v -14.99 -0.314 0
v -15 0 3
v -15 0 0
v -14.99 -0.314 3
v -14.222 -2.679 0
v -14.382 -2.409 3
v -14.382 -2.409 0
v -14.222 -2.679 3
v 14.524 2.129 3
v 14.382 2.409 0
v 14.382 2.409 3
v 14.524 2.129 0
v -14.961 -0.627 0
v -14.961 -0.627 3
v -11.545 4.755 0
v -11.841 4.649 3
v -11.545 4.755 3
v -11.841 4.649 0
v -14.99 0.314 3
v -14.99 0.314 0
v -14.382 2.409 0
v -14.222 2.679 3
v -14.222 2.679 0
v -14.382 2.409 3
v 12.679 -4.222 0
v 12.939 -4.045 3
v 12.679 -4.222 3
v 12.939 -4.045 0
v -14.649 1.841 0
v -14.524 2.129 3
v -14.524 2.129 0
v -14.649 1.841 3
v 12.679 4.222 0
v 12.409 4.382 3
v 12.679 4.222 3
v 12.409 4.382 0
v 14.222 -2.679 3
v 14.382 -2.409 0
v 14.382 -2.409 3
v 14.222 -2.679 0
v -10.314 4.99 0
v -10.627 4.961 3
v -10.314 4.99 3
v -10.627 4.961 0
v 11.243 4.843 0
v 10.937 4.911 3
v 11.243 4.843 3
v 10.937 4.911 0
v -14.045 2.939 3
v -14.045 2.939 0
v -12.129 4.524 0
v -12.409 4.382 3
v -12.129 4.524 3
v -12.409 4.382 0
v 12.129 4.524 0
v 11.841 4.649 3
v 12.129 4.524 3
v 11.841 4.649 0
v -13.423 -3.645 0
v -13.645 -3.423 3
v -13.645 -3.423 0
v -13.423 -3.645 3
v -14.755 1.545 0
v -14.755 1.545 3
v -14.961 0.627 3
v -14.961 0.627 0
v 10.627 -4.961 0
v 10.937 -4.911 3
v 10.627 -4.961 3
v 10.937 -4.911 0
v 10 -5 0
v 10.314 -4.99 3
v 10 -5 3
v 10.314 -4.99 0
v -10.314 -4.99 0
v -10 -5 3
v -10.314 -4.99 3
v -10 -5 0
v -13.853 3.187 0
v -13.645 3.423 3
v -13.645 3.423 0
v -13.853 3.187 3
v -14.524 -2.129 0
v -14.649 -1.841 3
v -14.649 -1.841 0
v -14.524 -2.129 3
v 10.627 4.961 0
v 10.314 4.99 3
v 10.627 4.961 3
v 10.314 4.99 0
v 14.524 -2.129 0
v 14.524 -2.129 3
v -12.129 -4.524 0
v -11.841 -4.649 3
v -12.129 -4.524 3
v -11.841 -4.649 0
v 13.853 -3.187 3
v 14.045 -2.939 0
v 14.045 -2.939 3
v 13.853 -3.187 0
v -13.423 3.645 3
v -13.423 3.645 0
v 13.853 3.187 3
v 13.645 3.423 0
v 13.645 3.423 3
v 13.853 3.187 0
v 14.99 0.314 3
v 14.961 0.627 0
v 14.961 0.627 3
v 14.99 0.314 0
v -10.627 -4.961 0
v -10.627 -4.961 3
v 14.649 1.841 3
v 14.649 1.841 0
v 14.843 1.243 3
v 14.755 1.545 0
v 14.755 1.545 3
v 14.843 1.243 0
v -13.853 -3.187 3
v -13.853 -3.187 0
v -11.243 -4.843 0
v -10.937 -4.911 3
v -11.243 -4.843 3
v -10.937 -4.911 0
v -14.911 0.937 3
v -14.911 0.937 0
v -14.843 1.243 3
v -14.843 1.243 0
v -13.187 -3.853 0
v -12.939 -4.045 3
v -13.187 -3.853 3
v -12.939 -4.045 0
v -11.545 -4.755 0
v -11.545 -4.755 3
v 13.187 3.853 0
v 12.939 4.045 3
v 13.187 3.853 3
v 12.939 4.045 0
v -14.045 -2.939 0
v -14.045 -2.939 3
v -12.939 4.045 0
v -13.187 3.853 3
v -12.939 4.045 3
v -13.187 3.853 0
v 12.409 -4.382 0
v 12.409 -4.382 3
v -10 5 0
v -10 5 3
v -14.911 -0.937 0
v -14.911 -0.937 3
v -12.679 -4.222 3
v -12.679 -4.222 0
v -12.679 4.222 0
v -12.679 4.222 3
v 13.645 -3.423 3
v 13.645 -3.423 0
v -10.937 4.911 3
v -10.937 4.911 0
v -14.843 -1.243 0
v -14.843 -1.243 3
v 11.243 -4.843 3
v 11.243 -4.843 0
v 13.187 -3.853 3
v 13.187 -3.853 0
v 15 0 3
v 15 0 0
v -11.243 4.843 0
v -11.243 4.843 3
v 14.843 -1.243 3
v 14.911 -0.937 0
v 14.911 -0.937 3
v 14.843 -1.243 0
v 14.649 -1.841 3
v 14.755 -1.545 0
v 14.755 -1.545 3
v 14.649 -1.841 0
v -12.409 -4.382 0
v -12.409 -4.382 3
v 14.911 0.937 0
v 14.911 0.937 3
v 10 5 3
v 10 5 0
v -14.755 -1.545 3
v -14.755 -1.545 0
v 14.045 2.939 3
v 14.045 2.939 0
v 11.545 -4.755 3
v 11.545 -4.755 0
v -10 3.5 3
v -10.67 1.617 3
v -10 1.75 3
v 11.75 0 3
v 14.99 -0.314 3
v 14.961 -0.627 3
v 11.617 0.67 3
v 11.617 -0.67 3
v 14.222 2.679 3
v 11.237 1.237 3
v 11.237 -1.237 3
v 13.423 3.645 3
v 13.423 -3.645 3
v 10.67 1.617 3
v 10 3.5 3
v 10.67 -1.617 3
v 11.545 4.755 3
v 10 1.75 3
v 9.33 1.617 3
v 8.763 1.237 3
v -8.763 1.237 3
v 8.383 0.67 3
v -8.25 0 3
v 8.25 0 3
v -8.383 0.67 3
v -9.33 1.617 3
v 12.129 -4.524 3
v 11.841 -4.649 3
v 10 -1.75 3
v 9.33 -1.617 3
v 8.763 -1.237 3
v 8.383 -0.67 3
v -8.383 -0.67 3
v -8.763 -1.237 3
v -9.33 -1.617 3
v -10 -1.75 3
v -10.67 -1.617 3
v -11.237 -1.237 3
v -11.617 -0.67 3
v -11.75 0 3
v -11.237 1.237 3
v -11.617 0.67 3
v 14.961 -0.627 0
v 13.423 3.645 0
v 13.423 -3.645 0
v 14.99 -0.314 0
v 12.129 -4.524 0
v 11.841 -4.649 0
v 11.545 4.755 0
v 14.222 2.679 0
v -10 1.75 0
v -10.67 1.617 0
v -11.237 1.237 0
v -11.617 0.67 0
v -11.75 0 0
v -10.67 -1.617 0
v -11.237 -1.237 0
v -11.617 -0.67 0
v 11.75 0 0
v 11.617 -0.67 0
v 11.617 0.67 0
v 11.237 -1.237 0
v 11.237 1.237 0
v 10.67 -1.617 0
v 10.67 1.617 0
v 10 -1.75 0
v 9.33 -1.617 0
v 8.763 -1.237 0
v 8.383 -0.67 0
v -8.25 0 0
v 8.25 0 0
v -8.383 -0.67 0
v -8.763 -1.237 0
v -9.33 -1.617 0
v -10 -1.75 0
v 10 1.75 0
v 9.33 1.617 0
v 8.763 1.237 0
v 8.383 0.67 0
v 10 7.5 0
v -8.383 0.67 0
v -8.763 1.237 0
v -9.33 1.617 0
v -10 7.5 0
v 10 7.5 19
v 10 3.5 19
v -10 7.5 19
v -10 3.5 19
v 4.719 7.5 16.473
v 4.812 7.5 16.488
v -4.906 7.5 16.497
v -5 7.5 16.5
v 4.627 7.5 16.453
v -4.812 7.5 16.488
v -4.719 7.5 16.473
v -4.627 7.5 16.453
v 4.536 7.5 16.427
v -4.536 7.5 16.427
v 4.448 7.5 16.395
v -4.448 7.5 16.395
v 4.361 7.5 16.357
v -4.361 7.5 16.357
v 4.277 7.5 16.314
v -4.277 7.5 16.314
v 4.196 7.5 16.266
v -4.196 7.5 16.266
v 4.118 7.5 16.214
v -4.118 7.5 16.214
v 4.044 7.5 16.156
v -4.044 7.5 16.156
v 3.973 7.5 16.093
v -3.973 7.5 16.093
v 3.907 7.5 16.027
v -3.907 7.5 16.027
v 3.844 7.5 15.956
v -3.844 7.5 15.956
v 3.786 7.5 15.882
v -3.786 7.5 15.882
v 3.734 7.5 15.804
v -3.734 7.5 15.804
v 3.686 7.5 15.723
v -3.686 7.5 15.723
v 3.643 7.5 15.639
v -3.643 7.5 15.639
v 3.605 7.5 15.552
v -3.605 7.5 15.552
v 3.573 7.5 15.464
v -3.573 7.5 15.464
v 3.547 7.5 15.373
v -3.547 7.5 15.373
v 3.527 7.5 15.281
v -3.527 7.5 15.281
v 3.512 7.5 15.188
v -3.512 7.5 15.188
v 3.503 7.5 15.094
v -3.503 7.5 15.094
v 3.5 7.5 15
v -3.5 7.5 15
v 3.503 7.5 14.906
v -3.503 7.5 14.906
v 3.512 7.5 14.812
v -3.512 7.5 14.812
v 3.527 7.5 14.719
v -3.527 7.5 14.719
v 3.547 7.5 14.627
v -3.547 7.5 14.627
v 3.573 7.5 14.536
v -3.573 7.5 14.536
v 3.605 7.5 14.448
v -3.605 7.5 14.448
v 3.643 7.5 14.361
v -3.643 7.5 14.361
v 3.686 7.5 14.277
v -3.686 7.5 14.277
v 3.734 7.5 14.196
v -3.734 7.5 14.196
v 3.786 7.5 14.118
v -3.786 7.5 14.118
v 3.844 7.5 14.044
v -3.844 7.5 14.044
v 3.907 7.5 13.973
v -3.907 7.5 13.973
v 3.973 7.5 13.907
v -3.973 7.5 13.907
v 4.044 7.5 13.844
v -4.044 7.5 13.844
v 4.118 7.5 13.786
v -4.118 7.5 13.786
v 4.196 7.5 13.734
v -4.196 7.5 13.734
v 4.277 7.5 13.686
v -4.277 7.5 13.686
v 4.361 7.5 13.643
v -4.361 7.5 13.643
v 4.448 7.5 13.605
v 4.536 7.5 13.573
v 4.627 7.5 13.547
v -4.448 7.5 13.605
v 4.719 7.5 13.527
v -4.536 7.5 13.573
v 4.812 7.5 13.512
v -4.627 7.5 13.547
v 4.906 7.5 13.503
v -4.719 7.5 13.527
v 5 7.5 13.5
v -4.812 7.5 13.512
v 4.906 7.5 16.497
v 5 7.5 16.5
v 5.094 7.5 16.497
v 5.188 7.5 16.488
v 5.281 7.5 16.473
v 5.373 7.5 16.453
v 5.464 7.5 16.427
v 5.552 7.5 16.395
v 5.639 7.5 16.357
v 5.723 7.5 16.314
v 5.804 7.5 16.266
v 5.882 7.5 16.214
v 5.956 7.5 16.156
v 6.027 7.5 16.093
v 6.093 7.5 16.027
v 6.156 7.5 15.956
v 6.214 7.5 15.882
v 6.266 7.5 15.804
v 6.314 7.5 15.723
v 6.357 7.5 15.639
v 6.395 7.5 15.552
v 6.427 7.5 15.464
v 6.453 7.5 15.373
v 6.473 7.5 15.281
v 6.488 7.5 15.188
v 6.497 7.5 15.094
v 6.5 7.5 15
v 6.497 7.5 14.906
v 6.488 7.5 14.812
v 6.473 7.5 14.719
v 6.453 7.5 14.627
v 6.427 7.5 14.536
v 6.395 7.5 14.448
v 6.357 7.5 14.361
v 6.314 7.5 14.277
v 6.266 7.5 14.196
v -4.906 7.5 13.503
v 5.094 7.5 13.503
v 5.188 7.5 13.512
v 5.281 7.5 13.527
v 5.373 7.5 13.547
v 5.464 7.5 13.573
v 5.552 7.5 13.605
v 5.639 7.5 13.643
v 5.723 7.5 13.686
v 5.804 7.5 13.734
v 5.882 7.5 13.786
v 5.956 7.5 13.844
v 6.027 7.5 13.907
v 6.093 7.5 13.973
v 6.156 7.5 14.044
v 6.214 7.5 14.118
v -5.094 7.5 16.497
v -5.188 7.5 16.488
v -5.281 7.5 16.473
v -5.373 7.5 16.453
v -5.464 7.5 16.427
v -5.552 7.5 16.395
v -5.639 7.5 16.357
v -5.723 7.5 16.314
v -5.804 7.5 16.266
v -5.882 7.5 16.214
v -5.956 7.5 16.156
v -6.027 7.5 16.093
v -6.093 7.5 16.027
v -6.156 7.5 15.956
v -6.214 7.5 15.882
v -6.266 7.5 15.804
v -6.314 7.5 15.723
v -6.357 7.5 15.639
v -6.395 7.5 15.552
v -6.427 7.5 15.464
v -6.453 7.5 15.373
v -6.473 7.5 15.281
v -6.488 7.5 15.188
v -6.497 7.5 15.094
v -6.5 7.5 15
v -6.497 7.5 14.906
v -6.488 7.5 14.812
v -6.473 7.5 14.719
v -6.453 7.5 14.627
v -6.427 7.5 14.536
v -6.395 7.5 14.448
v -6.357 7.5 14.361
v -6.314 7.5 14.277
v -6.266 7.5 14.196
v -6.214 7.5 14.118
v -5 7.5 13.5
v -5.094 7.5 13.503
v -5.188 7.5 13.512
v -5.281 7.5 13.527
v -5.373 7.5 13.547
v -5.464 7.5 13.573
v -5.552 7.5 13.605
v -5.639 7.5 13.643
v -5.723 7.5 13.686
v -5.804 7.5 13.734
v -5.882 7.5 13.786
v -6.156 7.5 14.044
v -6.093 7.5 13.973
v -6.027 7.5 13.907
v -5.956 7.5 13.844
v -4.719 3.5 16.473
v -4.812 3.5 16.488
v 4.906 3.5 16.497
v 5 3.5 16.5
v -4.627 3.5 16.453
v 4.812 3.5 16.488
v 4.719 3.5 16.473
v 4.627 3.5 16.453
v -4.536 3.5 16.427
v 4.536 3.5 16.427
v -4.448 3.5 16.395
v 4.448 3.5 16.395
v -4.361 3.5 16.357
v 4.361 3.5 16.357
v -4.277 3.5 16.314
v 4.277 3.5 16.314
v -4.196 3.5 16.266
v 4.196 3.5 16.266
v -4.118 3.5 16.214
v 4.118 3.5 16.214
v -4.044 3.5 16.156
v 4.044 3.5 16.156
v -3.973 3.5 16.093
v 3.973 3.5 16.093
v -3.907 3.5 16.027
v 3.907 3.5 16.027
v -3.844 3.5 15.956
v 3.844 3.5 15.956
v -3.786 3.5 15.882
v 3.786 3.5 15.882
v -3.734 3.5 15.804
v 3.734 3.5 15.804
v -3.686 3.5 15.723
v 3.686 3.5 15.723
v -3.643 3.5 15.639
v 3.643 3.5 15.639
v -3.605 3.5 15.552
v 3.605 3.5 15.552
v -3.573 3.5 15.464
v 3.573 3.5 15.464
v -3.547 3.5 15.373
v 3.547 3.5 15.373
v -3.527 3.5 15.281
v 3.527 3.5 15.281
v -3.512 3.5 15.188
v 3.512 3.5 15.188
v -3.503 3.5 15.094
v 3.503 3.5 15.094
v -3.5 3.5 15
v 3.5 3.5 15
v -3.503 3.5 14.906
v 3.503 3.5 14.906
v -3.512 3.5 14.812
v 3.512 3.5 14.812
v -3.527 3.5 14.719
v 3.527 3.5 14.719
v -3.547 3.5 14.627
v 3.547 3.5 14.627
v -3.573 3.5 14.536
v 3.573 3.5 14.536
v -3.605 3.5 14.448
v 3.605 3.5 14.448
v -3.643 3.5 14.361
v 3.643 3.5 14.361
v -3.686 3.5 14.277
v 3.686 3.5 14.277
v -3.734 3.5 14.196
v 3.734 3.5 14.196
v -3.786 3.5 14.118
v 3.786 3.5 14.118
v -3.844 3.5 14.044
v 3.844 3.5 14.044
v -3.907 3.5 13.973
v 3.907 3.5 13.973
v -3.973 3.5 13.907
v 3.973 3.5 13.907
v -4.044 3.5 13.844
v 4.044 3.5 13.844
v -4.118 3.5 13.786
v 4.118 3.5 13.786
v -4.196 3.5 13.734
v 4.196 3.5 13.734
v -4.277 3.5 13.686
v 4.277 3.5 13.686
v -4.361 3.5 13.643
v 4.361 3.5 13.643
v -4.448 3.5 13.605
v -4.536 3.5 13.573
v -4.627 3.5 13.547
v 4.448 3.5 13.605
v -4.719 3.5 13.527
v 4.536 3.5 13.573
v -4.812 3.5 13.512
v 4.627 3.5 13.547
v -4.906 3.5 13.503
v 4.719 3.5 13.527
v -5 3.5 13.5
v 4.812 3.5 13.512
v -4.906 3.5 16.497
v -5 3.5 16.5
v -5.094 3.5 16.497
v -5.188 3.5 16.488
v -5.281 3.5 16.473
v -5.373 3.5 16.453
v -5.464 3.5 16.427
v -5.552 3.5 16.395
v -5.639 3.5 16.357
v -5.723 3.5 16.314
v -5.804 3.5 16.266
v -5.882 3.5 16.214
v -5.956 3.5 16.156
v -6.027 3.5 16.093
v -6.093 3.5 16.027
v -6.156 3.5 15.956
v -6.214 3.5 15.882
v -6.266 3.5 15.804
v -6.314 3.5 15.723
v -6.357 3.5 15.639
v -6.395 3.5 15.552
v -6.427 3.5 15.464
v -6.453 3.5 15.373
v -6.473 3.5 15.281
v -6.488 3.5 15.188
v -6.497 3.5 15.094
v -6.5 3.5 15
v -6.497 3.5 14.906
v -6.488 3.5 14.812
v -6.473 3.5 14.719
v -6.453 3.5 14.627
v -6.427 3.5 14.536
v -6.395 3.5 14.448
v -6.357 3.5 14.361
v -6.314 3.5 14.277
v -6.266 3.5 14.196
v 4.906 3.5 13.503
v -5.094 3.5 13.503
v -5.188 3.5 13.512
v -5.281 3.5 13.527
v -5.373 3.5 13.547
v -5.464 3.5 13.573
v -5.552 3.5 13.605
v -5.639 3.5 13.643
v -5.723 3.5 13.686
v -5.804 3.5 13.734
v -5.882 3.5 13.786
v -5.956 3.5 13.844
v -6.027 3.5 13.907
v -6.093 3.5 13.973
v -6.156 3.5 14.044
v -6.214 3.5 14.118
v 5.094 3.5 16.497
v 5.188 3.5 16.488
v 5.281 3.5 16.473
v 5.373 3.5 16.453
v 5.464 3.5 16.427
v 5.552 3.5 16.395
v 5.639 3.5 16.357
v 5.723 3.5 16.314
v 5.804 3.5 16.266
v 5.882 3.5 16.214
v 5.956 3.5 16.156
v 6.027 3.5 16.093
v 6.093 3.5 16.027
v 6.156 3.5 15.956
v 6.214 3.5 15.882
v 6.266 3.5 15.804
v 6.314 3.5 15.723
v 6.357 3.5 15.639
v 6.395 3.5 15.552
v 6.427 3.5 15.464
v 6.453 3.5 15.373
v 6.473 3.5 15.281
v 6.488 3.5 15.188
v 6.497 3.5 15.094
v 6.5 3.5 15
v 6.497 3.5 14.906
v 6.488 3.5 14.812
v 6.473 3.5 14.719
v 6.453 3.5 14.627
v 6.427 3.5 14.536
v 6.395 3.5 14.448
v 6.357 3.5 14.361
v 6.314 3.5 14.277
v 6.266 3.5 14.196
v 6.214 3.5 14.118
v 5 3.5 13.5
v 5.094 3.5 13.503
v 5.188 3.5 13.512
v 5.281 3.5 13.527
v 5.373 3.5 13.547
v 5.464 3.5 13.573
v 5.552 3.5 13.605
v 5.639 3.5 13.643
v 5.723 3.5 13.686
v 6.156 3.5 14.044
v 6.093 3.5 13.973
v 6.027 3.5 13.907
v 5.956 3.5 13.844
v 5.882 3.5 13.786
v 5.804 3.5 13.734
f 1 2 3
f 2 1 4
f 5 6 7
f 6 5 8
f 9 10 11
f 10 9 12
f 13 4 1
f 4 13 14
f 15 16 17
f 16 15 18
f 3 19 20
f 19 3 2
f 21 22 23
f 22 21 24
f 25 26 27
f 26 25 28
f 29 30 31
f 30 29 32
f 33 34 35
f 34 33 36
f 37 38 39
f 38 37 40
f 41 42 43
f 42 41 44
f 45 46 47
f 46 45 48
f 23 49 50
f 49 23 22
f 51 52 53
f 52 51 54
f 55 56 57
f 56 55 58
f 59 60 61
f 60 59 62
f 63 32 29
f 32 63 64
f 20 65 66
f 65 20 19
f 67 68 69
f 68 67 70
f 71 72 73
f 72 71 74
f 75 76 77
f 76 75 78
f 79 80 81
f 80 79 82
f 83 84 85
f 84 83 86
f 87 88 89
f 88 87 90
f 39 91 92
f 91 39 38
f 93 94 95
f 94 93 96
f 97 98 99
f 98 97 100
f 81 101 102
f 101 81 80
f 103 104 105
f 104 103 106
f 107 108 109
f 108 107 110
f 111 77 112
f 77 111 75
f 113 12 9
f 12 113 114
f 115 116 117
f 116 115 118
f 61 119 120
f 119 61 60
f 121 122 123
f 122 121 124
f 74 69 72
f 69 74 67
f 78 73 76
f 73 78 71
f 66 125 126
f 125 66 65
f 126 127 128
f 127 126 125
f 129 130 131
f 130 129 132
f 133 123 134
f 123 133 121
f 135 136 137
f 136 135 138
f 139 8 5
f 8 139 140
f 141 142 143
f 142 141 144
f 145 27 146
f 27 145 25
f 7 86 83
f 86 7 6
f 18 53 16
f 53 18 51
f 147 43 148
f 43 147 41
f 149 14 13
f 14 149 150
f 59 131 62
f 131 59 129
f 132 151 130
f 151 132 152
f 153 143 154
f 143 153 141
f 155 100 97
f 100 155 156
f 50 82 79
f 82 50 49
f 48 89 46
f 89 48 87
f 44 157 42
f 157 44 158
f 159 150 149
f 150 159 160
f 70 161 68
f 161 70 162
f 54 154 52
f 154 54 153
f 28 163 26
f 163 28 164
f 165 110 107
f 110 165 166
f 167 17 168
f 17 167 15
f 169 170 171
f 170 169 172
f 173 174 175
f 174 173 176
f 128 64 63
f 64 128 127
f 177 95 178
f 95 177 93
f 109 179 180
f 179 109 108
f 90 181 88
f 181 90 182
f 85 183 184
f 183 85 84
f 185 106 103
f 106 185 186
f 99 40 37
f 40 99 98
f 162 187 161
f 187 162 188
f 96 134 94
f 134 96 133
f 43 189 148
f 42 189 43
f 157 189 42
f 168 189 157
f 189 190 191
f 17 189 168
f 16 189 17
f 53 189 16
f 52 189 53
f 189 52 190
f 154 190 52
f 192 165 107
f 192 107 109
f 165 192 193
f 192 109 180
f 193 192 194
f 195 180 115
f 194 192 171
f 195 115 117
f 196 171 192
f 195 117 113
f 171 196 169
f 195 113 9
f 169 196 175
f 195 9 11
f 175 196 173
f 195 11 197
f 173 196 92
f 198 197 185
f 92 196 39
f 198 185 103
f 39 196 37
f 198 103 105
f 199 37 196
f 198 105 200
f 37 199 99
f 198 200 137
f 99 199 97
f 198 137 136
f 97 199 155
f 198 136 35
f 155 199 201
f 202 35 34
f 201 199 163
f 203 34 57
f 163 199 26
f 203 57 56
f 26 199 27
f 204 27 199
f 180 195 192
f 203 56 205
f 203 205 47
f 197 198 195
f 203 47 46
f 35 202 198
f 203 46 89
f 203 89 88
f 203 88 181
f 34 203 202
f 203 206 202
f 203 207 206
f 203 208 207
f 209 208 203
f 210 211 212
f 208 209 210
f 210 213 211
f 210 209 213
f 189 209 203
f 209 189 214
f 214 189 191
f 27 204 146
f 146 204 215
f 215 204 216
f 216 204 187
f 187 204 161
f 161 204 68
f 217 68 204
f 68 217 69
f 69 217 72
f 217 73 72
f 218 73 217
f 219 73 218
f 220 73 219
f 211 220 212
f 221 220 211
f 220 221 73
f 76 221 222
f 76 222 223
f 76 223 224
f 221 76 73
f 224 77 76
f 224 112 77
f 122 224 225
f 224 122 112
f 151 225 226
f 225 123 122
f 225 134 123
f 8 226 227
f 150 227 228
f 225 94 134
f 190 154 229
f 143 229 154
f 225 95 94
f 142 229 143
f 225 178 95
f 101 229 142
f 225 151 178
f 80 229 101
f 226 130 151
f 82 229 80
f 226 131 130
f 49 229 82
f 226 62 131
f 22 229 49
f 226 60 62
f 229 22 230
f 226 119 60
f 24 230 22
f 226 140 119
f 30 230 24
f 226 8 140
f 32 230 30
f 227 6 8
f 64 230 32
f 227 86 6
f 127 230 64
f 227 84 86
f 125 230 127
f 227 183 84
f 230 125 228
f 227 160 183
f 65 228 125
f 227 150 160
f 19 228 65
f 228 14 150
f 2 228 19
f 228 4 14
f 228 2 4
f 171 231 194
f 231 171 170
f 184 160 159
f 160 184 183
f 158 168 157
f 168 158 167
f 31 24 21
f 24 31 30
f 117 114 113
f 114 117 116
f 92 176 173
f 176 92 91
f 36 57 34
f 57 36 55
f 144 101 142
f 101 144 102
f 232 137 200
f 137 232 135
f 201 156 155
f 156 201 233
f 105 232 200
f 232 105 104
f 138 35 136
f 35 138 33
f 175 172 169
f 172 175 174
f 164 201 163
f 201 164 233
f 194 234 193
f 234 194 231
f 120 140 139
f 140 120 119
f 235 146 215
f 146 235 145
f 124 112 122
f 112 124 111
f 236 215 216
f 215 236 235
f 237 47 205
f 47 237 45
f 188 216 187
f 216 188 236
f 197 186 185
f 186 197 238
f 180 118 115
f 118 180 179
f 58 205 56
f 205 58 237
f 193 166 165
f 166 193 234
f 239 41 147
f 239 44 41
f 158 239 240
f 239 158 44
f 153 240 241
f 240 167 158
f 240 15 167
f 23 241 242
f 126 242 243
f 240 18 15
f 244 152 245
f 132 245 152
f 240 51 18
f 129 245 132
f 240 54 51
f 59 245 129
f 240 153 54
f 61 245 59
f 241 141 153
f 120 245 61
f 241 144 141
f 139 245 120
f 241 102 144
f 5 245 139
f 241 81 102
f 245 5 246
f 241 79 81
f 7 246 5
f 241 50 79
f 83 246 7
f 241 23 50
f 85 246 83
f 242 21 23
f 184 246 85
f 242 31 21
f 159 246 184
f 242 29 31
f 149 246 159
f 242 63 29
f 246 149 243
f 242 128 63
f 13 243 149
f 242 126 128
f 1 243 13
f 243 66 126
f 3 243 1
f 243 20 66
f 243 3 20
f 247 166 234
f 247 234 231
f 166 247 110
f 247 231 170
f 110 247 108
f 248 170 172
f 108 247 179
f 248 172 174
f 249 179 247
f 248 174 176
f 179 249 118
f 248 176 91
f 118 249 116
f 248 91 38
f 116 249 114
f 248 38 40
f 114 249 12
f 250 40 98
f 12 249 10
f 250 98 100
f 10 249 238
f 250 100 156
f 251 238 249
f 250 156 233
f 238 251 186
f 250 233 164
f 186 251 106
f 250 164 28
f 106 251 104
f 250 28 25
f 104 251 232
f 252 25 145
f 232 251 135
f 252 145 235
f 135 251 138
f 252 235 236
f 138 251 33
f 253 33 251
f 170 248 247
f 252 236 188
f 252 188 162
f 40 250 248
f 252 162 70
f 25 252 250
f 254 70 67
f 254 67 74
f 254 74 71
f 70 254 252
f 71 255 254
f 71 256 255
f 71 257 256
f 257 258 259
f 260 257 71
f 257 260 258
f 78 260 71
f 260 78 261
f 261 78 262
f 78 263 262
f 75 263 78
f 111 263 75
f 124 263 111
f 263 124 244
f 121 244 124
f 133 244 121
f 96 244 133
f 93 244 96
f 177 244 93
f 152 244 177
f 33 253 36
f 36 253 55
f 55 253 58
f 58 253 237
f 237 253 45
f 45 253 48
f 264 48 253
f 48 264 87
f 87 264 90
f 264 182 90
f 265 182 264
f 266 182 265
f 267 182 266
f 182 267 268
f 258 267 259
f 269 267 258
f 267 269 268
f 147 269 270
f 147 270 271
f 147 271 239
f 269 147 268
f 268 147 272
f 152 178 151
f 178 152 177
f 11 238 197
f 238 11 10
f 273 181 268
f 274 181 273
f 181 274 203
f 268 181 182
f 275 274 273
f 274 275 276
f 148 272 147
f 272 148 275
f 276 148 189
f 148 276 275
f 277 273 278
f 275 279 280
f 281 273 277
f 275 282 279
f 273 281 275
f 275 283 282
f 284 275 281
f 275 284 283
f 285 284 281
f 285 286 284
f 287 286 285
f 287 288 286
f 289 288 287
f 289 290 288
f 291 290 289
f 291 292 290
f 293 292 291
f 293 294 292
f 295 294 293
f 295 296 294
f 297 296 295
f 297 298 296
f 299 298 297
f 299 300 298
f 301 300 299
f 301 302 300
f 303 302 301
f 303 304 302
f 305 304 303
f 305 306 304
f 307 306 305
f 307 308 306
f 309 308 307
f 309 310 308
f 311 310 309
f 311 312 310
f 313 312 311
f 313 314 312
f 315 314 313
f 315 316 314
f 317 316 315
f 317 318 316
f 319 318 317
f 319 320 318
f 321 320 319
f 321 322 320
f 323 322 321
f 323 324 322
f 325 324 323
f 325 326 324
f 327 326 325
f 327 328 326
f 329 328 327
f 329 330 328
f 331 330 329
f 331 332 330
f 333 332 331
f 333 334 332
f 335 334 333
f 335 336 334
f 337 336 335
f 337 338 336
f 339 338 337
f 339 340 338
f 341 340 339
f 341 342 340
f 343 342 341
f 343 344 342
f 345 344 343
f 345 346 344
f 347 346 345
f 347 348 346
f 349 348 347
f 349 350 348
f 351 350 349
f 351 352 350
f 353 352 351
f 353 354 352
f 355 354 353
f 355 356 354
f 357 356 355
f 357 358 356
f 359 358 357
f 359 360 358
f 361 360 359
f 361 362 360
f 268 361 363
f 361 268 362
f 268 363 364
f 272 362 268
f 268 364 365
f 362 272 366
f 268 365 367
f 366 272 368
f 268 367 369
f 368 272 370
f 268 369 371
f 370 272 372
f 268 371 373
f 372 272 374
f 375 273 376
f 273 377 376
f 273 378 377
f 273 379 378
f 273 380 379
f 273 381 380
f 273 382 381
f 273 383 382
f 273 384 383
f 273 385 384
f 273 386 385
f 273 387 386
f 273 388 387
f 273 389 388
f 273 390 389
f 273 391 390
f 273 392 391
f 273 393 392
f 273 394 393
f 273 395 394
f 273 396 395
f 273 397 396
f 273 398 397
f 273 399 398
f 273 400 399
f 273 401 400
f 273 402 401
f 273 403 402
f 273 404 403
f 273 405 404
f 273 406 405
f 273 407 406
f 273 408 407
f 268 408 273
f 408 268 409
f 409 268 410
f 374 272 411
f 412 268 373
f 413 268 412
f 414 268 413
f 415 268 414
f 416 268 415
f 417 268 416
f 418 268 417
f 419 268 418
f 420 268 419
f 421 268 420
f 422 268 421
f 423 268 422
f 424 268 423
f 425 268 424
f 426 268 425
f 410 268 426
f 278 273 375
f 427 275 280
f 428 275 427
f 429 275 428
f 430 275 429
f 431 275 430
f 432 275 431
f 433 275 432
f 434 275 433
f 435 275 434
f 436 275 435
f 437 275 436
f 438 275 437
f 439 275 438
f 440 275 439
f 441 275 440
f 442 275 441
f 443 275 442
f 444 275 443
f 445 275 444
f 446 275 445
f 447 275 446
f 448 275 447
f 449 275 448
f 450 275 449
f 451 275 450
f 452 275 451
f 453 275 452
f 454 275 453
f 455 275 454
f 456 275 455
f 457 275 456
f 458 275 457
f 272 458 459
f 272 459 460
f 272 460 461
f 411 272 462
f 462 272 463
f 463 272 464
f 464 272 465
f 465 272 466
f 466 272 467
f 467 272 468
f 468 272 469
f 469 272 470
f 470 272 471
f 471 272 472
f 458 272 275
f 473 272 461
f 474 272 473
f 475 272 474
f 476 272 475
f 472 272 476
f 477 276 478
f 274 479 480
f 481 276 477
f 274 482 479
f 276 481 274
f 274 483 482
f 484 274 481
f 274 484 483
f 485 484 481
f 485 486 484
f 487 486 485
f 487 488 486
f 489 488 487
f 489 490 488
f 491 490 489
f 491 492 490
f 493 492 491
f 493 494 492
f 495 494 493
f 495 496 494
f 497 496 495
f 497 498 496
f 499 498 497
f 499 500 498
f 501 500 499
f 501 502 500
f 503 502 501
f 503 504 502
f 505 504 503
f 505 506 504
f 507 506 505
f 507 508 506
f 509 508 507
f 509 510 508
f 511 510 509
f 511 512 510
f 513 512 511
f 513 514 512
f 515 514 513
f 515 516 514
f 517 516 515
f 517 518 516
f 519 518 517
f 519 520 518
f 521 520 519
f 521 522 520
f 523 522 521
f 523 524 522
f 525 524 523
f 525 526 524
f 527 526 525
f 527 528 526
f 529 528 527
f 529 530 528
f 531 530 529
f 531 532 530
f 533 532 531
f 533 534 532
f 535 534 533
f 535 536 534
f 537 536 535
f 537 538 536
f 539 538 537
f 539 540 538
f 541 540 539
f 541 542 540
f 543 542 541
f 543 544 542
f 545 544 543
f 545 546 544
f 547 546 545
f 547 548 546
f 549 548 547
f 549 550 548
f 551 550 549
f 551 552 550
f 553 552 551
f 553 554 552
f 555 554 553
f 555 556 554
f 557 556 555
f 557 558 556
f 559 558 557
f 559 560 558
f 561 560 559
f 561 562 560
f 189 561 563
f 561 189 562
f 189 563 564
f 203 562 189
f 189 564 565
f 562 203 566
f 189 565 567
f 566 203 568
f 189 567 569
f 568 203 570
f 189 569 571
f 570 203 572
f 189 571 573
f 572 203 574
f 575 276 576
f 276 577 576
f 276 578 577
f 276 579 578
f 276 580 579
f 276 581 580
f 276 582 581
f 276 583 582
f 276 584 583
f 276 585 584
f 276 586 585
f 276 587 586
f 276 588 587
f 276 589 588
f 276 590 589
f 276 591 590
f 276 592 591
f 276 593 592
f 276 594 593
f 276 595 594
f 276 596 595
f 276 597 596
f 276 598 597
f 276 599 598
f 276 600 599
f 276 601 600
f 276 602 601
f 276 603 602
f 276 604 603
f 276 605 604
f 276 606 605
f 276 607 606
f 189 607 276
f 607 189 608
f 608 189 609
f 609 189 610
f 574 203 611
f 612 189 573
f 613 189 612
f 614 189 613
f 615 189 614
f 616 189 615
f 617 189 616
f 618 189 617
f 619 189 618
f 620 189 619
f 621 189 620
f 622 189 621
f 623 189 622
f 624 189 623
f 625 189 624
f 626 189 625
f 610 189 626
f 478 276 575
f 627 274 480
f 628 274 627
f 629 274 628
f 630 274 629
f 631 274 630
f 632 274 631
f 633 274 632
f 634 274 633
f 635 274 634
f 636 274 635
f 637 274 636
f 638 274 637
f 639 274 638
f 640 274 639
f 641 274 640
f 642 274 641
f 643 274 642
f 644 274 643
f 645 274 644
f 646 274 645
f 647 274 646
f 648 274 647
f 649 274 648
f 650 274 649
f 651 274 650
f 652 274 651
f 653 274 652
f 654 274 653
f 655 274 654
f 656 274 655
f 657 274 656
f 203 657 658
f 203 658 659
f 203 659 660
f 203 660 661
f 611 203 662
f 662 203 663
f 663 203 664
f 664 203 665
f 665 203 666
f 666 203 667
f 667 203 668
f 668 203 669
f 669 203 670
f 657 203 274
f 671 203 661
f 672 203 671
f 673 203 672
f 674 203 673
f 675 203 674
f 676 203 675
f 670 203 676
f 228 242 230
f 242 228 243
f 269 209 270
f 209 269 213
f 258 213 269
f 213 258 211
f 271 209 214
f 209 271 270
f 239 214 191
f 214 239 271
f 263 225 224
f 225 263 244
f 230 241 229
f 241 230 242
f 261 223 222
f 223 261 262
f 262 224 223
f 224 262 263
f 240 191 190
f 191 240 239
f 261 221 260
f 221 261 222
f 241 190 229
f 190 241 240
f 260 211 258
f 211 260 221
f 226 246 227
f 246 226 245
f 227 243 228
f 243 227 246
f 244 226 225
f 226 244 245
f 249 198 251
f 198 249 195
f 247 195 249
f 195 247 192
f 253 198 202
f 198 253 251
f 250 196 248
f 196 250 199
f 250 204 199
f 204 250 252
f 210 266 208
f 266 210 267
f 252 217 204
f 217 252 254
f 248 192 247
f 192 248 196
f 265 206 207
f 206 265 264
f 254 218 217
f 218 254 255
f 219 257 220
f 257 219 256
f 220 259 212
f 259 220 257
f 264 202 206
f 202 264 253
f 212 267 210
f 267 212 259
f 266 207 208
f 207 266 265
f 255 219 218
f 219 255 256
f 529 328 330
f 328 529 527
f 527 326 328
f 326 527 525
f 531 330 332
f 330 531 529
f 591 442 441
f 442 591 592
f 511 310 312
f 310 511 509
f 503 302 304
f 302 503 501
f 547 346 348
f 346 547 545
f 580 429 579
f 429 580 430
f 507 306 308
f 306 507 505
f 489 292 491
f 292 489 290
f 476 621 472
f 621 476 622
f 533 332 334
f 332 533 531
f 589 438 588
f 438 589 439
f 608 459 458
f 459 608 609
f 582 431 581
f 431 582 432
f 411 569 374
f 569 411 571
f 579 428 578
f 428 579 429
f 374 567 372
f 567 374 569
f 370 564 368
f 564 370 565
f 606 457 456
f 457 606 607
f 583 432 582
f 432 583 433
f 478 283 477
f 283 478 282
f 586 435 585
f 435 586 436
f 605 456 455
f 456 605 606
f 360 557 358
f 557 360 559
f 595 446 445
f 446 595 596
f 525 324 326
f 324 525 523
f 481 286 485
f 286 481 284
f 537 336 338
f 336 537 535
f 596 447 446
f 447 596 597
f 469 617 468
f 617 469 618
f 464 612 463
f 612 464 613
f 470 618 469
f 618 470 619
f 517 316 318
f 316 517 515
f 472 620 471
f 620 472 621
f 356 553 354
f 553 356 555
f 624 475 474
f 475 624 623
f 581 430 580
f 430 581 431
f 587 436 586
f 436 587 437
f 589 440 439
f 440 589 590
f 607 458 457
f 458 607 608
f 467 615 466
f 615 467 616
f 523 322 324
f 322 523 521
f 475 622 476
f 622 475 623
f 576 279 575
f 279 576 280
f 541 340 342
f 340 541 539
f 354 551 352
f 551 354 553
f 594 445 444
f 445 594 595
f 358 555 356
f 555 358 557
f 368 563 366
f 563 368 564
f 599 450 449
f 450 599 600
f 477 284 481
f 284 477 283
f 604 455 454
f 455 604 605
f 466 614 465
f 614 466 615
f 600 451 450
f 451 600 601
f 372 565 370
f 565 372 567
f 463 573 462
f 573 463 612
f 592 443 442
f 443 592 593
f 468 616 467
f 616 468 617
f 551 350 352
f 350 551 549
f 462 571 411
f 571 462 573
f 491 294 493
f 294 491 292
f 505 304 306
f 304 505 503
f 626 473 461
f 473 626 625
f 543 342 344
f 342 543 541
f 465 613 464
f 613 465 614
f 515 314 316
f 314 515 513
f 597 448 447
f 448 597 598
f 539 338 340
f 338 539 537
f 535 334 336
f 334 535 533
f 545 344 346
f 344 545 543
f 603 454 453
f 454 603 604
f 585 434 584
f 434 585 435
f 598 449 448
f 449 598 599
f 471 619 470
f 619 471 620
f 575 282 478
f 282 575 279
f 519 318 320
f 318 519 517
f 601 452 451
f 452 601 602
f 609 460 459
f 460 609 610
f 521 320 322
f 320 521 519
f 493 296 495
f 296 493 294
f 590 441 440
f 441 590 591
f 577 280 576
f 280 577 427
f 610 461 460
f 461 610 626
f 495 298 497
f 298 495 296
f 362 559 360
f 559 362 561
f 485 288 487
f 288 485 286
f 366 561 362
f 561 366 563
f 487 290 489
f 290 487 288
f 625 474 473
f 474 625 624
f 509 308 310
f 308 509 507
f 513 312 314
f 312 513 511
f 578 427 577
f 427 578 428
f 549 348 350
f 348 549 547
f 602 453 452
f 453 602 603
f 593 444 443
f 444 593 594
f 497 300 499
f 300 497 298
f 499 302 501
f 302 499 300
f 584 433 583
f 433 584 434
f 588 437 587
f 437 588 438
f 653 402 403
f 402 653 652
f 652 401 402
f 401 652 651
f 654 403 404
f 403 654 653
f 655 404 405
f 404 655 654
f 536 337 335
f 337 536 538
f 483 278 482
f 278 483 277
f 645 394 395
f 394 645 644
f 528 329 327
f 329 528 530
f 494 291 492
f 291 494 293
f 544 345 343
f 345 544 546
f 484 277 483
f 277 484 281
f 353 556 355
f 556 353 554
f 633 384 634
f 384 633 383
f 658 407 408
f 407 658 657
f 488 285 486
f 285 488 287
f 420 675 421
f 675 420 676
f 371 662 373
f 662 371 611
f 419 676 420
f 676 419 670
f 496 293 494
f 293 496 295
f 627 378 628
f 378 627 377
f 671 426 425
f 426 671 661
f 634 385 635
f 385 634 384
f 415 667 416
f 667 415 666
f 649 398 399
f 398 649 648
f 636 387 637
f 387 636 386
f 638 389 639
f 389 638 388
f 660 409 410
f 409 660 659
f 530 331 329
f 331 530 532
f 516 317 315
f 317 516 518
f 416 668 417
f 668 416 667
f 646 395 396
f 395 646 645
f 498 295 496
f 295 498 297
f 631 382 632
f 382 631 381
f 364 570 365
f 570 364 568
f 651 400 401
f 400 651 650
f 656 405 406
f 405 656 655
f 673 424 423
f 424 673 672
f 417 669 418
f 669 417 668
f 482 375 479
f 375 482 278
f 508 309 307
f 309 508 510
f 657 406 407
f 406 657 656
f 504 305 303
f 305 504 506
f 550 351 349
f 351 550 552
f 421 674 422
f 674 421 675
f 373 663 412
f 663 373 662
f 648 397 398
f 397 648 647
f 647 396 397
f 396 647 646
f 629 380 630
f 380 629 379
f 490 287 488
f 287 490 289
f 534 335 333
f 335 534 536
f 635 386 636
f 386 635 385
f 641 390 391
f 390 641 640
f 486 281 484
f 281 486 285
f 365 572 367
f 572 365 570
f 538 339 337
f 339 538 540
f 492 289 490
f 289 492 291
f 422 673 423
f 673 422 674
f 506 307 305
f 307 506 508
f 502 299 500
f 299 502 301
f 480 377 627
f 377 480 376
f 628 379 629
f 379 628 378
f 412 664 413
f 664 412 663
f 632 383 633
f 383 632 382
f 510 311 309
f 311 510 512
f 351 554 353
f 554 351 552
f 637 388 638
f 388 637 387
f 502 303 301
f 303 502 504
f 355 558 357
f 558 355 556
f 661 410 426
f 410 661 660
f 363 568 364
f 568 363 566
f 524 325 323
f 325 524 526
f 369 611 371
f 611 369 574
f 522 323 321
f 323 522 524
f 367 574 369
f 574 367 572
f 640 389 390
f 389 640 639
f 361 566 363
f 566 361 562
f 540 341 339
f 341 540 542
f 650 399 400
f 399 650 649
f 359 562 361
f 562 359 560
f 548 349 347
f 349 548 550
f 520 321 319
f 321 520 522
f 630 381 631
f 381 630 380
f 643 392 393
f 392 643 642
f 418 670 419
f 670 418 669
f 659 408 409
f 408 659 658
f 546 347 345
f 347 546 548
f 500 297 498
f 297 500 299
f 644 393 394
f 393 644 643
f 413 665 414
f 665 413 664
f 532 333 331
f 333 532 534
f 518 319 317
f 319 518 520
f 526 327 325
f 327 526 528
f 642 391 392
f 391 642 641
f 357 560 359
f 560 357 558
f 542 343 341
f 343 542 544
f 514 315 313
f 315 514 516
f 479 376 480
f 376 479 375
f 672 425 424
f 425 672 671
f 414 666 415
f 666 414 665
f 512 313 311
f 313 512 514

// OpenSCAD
// file: config.scad
r4 = 2.2;
r8 = 4.2;
r10 = 5.2;

layer_height = 0.25;

switch_d = 9.6;

nema17_r_vis = 15.5;
nema17_r_centre = 11.5;
nema17_h_centre = 2;
nema17_h = 43;
nema17_l = 40;

boite_ui_largeur = 28.5;
boite_ui_l = 46;

support_laser = 24;

r3 = 1.75;
r3_2d = 1.5;
r3_vis = 1.65;
r3_head = 3.6;
m3_r = r3;
m3_nut_d = 7;
m3_nut_d2 = 6.2;
m3_nut_h = 3;

m4_nut_d = 8;
m4_nut_d2 = 7;
m4_nut_h = 4;

608_r = 23/2;
608_h = 8;

laser_printer_l = 609;
laser_printer_lg = 456;

module support_nut(d=3, l_screw1 = 20, l_screw2 = 20, l_nut = 20, h_screw2 = -0.1){
    if(d==3){
        screw_r = r3;
        nut_r = m3_nut_d/2;
        nut_h = m3_nut_h;
        cylinder(nut_h, r = nut_r, $fn = 6, center = true);
        translate([0, 0, -l_screw1])cylinder(l_screw1 +1, r = screw_r);
        translate([0, 0, m3_nut_h/2+ h_screw2])cylinder(l_screw2, r = screw_r);
        l = m3_nut_d*cos(30);
        translate([0, -l/2, -nut_h/2]) cube([l_nut, l,nut_h]);
    } else if(d==4){
        screw_r = r4;
        nut_r = m4_nut_d/2;
        nut_h = m4_nut_h;
        cylinder(nut_h, r = nut_r, $fn = 6, center = true);
        translate([0, 0, -l_screw1])cylinder(l_screw1 +1, r = screw_r);
        translate([0, 0, m4_nut_h/2+ h_screw2])cylinder(l_screw2, r = screw_r);
        l = m4_nut_d*cos(30);
        translate([0, -l/2, -nut_h/2]) cube([l_nut, l,nut_h]);
    }
}


module nut(d=3, center = false){
    nut_r = m3_nut_d/2;
    nut_h = m3_nut_h;
    if(d==3){
        nut_r = m3_nut_d/2;
        nut_h = m3_nut_h;
    } 
    cylinder(nut_h, r = nut_r, $fn = 6, center = center);
}



module m3(h, nut = false, head = false){
    cylinder(h, m3_r, m3_r, $fn=16);
    if(nut){
        cylinder(m3_nut_h, r = m3_nut_d/2, $fn = 6);
    }
}

module m3_nut(h){
    cylinder(m3_nut_h, r = m3_nut_d/2, $fn = 6);
    translate([0, -m3_nut_d2/2, 0]) cube([h, m3_nut_d2, m3_nut_h]);
}

m4_r = 2.3;
m4_nut_d = 8.4;
m4_nut_d2 = 7.5;
m4_nut_h = 3.5;
module m4(h, nut = false, head = false){
    cylinder(h, m4_r, m4_r);
    if(nut){
        cylinder(m4_nut_h, r = m4_nut_d/2, $fn = 6);
    }
}

module m5(h, nut = false, head = false){
    cylinder(h, r = 2.7);
}

m8_nut_d = 15;
m8_nut_d2 = 13;
m8_nut_h = 6.5;
module m8(h, nut = false, head = false){
    cylinder(h, r = r8);
    if(nut){
        cylinder(m8_nut_h, r = m8_nut_d/2, $fn = 6);
    }
}

module cube_arrondi(x, y, z, r=2){
    hull(){
        translate([(x/2-r), (y/2-r), 0]) cylinder(z,r=r);
        translate([(x/2-r), -(y/2-r), 0]) cylinder(z,r=r);
        translate([-(x/2-r), (y/2-r), 0]) cylinder(z,r=r);
        translate([-(x/2-r), -(y/2-r), 0]) cylinder(z,r=r);
    }
}

module demi_glissiere(r, l, h){
    cylinder(h, r, r);
    translate([-r, 0, 0]) cube([r*2, l, h]);
}


module nema17_2d(){
    nema17_l = 43;
    nema17_h = 6;
    polygon([[0,nema17_h], [nema17_h,0]
            , [nema17_l-nema17_h,0],[nema17_l,nema17_h]
            , [nema17_l,nema17_l-nema17_h],[nema17_l-nema17_h,nema17_l]
            , [8,nema17_l],[0,nema17_l-nema17_h] ]);
}

module nema17_2d2(){
    translate([nema17_r_vis, nema17_r_vis] ) circle(r3_2d);
    translate([nema17_r_vis, -nema17_r_vis] ) circle(r3_2d);
    translate([-nema17_r_vis, nema17_r_vis] ) circle(r3_2d);
    translate([-nema17_r_vis, -nema17_r_vis] ) circle(r3_2d);
    circle(nema17_r_centre);
}


module nema17(){
    translate([-nema17_h/2, -nema17_h/2, -nema17_l/2] ) linear_extrude(nema17_l) nema17_2d();
    
    h = nema17_h/2+6;
    translate([nema17_r_vis, nema17_r_vis, 0] )rotate([0, 0, 0]) cylinder(h, r = r3);
    translate([nema17_r_vis, -nema17_r_vis, 0] )rotate([0, 0, 0]) cylinder(h, r = r3);
    translate([-nema17_r_vis, nema17_r_vis, 0] )rotate([0, 0, 0]) cylinder(h, r = r3);
    translate([-nema17_r_vis, -nema17_r_vis, 0] )rotate([0, 0, 0]) cylinder(h, r = r3);
    cylinder(h, nema17_r_centre, nema17_r_centre);
    cylinder(h+14, r = 8);
    
    translate([-8.5, 0, -nema17_l/2] ) cube([17,30, 10]);
}

module corner(l_corner, h_corner, lg_corner){
    translate([0, lg_corner, 0]) rotate([90, 0, 0]) linear_extrude(lg_corner) polygon([[0,0], [l_corner, 0], [0, h_corner]]);
}


/**
 * 2D
 **/

module m3_2d(){
    circle(r3_2d);
}


module cran_x(_l, e, cran, inv){
    difference(){
        square([_l, e]);
        if(inv){
            for(i=[-round(_l/cran):round(_l/cran)]){
                translate([_l/2 + cran/2 - 2*i*cran, -1]) square([cran, e+2]);
            }
        }else{
            for(i=[-round(_l/cran):round(_l/cran)]){
                translate([_l/2 - cran/2 - 2*i*cran, -1]) square([cran, e+2]);
            }
        }
    }
}

module cran_y(_l, e, cran, inv){
    translate([e, 0]) rotate([0, 0, 90]) cran_x(_l, e, cran, inv); 
}

module whole_2d(type_vis){
    if(type_vis == 3){
        circle(1.5);
    } else if(type_vis == 4){
        circle(2);
    } else {
        echo("whole_2d " + type_vis);
    }
}

module nuts_2d(type_vis){
    if(type_vis == 3){
        translate([-1.5, 0])square([3, 20]);
        translate([-5.5/2, 10])square([5.5, 2.5]);
    } else if(type_vis == 4){
        translate([-2, 0])square([4, 30]);
        translate([-7/2, 20])square([7, 3.5]);
    } else {
        echo("nuts_2d " + type_vis);
    }
}

module cran_x_vis(_l, e, cran, type_vis = 3, trous = [0.1, 0.5, 0.9]){
    difference(){
        square([_l, e]);
        for(i=[-round(_l/cran):round(_l/cran)]){
                translate([_l/2 - cran/2 - 2*i*cran, -1]) square([cran, e+2]);
            }
        
    }
    for(i = trous){
        j = round((i-0.5)*_l/(2*cran));
        translate([_l/2  - 2*j*cran, e/2]) whole_2d(type_vis);
    }
}

module cran_x_nuts(_l, e, cran, type_vis = 3, trous = [0.1, 0.5, 0.9]){
    difference(){
        square([_l, e]);
        for(i=[-round(_l/cran):round(_l/cran)]){
                translate([_l/2 + cran/2 - 2*i*cran, -1]) square([cran, e+2]);
        }
    }
    for(i = trous){
        j = round((i-0.5)*_l/(2*cran));
        translate([_l/2  - 2*j*cran, e/2]) nuts_2d(type_vis);
    }
}

module cran_y_vis(_l, e, cran, type_vis = 3, trous = [0.1, 0.5, 0.9]){
    translate([e, 0]) rotate([0, 0, 90]) cran_x_vis(_l, e, cran, type_vis, trous);
}

module cran_y_nuts(_l, e, cran, type_vis = 3, trous = [0.1, 0.5, 0.9]){
    translate([0, _l]) rotate([0, 0, -90]) cran_x_nuts(_l, e, cran, type_vis, trous);
}


module fixation_2d(){
    translate([-5,0])square([2,4], center=true);
    translate([5,0])square([2,4], center=true);
}
// main file
include <config.scad>

e =3;
$fn=100;

module z_stop(){
    vis_ecart = 20;
    h = 15;
    difference(){
        union(){
            hull(){
                translate([-vis_ecart/2, 0, 0]) cylinder(e, r = 5);
                translate([vis_ecart/2, 0, 0]) cylinder(e, r = 5);
            }
            translate([-10, 3.5, 0])cube([20,4,h+4]);
        }
        translate([-vis_ecart/2, 0, -1]) m3(10);
        translate([vis_ecart/2, 0, -1]) m3(10);
        
        translate([-10/2, 0, h]) rotate([-90,0,0]) cylinder(30, r= 3/2);
        translate([10/2, 0, h]) rotate([-90,0,0]) cylinder(30, r= 3/2);
    }
}

z_stop();
//z_ecrou();
//xy(120);

//corner();
//translate([0,2*lg_xy+4,0])middle2();
